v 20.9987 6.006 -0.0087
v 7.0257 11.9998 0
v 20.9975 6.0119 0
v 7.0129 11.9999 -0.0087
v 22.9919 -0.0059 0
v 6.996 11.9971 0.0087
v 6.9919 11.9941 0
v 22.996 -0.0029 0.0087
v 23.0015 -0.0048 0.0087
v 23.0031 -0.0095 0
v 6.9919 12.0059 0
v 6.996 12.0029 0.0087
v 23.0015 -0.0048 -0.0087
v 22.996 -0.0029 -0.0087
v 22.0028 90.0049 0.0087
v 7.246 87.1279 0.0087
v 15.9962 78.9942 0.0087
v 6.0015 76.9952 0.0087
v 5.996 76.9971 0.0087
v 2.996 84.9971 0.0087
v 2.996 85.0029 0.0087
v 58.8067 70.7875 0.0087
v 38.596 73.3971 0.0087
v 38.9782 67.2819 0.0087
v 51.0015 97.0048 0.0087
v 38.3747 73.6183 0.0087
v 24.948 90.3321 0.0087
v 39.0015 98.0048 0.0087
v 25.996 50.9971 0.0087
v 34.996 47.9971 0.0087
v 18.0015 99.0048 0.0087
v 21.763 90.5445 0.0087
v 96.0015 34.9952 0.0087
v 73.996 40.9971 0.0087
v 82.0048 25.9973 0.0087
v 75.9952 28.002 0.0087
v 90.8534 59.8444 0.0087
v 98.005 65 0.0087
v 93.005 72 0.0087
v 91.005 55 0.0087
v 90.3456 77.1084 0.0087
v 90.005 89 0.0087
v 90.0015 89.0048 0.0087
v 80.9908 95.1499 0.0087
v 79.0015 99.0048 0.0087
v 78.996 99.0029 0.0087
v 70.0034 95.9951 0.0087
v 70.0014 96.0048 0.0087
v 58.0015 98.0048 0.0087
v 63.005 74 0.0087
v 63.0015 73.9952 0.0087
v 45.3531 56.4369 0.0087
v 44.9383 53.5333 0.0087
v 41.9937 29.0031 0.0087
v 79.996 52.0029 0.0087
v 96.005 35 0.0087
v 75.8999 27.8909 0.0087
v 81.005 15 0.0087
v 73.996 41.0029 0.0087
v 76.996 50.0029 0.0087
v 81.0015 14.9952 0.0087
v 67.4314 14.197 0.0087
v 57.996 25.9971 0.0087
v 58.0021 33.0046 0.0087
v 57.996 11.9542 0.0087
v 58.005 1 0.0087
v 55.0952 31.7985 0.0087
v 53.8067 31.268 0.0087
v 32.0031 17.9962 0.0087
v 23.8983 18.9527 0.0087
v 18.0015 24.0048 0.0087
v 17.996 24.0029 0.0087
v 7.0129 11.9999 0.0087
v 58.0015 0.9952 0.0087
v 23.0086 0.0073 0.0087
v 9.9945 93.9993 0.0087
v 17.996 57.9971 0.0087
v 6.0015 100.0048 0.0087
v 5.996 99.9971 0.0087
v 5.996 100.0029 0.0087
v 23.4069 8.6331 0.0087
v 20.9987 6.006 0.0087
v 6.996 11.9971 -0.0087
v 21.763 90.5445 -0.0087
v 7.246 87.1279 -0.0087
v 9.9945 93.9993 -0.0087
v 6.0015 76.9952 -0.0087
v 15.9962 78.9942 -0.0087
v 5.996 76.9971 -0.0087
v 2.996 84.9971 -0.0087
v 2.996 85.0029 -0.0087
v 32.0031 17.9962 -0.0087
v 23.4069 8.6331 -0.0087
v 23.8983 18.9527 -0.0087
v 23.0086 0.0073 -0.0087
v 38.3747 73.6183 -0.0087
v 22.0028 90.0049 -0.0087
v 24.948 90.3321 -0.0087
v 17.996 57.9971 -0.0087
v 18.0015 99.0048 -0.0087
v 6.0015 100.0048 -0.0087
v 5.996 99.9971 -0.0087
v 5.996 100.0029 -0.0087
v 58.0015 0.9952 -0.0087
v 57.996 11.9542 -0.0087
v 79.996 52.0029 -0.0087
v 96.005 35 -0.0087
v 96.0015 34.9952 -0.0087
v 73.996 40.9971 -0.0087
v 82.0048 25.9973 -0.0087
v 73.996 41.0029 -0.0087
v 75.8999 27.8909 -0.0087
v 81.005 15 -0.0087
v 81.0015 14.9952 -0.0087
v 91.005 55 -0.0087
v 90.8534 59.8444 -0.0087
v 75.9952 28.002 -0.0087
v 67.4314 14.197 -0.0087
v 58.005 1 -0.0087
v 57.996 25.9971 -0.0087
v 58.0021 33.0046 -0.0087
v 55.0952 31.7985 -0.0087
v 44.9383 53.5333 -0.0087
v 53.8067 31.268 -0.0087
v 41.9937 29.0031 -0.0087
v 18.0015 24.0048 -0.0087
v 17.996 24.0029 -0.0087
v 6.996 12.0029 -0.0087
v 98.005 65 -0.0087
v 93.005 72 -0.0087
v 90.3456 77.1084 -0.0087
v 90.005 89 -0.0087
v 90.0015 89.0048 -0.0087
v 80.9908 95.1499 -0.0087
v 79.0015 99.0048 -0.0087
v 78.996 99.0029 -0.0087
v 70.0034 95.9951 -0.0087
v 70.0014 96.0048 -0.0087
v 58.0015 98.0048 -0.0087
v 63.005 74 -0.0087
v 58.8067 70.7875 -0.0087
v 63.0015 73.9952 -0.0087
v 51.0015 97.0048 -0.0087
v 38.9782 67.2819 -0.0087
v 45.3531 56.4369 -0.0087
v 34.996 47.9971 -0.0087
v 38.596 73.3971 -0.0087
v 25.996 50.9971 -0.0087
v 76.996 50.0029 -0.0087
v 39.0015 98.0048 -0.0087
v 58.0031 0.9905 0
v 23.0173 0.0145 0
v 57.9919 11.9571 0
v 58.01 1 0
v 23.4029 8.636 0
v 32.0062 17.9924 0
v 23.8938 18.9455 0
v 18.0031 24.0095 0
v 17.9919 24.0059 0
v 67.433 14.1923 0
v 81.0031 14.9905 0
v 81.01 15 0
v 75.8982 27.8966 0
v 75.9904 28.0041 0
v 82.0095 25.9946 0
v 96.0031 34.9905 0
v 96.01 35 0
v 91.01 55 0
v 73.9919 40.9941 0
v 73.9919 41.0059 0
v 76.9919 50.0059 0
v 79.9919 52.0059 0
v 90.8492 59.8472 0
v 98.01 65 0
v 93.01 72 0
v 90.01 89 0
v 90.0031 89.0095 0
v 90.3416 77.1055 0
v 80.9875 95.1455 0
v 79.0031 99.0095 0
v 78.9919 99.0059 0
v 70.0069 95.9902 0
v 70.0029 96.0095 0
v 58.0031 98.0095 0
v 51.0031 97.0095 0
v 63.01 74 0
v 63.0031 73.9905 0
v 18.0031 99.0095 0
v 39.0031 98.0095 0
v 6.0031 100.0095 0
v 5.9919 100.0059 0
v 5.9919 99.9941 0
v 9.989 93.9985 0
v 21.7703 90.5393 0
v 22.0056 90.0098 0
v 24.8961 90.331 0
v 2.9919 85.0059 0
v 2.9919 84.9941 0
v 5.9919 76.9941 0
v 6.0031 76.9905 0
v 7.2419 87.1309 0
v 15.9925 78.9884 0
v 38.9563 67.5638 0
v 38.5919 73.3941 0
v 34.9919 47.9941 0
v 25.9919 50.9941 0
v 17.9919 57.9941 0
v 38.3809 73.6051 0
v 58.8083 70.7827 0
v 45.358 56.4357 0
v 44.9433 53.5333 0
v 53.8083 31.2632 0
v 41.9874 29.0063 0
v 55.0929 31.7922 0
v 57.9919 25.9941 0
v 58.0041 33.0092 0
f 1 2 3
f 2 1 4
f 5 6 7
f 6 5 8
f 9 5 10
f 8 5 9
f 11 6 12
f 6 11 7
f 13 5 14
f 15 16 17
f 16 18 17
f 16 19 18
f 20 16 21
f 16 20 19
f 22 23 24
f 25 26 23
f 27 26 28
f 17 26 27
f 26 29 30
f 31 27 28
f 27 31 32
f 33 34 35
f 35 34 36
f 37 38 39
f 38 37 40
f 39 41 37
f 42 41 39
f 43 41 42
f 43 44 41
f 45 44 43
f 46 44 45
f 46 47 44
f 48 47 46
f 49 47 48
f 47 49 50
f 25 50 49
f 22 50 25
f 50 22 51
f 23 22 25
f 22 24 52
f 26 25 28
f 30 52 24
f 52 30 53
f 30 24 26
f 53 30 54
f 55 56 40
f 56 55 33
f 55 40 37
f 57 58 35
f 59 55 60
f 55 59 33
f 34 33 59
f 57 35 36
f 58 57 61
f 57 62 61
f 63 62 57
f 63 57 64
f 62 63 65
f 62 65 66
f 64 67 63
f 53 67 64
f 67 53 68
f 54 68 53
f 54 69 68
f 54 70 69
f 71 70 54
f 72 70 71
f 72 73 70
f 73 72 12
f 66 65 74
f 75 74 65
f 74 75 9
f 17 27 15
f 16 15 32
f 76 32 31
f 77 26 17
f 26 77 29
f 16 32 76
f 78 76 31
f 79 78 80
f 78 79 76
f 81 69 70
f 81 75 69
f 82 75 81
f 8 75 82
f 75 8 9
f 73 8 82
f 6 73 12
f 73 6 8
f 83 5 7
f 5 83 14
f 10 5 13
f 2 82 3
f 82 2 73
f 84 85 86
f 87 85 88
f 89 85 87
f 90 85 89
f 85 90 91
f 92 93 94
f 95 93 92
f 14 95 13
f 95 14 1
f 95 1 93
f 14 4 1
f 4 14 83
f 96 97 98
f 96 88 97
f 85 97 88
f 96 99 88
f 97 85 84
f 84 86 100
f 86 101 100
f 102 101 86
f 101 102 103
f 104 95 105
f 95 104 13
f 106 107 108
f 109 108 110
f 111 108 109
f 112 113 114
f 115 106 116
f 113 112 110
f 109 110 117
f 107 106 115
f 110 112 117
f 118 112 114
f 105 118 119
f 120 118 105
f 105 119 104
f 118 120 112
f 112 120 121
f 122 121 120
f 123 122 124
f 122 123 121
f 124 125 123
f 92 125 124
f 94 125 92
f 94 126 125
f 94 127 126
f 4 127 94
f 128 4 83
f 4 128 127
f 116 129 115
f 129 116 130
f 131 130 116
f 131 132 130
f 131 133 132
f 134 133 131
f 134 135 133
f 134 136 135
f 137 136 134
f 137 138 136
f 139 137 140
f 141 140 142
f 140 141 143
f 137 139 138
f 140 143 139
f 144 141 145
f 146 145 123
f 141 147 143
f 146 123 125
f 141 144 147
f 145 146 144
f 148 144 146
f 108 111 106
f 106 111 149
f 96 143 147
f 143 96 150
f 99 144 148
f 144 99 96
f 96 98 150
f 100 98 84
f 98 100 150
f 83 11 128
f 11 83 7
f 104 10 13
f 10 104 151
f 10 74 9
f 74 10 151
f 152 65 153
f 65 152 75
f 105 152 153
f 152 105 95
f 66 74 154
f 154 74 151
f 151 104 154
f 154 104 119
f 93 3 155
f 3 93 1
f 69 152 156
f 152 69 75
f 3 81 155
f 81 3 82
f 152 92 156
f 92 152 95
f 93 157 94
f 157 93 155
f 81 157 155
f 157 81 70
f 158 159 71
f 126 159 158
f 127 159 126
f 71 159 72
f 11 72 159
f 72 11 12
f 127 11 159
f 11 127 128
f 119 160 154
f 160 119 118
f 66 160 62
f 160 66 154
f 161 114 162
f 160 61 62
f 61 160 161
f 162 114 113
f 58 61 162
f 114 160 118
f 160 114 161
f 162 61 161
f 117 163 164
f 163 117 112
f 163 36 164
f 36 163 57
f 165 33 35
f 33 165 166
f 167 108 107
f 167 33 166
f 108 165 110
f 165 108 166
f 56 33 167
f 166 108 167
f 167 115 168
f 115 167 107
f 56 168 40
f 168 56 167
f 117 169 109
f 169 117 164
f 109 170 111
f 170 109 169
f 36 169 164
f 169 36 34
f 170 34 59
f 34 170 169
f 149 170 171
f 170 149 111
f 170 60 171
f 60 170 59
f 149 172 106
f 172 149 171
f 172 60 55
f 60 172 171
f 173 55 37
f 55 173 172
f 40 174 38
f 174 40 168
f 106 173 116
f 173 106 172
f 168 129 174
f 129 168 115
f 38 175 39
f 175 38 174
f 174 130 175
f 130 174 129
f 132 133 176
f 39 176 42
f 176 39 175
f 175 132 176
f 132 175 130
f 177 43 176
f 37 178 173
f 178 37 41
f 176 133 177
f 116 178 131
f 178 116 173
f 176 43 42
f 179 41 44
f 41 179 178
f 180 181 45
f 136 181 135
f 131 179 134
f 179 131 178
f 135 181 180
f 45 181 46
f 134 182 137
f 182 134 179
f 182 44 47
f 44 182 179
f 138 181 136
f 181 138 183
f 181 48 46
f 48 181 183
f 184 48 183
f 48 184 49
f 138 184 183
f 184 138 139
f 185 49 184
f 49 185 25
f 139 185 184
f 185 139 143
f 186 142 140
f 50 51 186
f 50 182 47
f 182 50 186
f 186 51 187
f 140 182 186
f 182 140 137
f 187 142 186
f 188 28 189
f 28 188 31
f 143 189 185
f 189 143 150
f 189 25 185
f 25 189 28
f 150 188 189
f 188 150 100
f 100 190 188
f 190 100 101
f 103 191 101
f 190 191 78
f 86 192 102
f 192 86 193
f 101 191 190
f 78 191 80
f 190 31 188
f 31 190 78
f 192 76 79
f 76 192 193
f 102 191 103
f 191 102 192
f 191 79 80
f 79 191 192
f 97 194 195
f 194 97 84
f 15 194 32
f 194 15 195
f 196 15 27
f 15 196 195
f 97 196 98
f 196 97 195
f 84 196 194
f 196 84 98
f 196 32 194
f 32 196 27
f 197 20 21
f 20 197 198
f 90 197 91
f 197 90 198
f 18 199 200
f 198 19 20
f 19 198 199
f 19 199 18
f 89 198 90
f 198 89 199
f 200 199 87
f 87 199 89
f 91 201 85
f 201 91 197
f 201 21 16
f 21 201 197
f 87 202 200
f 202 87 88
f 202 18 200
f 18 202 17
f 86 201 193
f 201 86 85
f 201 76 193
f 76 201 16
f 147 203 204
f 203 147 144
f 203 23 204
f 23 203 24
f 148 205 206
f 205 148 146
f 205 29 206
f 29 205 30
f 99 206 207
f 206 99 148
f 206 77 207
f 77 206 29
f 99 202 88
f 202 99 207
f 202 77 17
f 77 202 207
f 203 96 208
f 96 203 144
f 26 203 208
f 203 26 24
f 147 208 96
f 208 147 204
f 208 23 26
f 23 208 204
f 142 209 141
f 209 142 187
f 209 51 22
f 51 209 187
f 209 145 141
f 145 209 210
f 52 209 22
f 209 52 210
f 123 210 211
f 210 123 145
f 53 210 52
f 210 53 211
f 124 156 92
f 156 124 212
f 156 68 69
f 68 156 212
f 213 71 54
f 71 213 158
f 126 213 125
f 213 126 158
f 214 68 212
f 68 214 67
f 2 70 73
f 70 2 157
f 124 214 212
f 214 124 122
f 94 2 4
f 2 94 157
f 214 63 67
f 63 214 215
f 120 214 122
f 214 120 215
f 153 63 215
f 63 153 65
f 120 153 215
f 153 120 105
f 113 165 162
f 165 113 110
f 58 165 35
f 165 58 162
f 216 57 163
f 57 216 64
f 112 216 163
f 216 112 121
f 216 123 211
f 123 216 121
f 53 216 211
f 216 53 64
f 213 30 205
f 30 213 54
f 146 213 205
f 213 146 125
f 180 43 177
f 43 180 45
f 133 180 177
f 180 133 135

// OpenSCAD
color([0.29310936231965135,0.08456113000314536,0.6409271470126323]) hull(){
    translate([7,12]) sphere(0.01);
    translate([21,6]) sphere(0.01);
    translate([23,0]) sphere(0.01);
}
color([0.38512246522478266,0.6162859510128613,0.407224705538046]) hull(){
    translate([23,0]) sphere(0.01);
    translate([58,1]) sphere(0.01);
    translate([64,14]) sphere(0.01);
}
color([0.6107800780239486,0.9541913078580654,0.09369719926319908]) hull(){
    translate([21,6]) sphere(0.01);
    translate([23,0]) sphere(0.01);
    translate([32,18]) sphere(0.01);
}
color([0.4396226851829427,0.9817497074141792,0.30111933510979894]) hull(){
    translate([32,18]) sphere(0.01);
    translate([23,0]) sphere(0.01);
    translate([26,22]) sphere(0.01);
}
color([0.08571041628526821,0.691130580335744,0.16573157374072334]) hull(){
    translate([26,22]) sphere(0.01);
    translate([23,0]) sphere(0.01);
    translate([24,21]) sphere(0.01);
}
color([0.4668304924867862,0.30100213617539295,0.3511677492745029]) hull(){
    translate([24,21]) sphere(0.01);
    translate([18,24]) sphere(0.01);
    translate([26,22]) sphere(0.01);
}
color([0.05564944269037686,0.7696481469448815,0.686275624239137]) hull(){
    translate([18,24]) sphere(0.01);
    translate([7,12]) sphere(0.01);
    translate([26,22]) sphere(0.01);
}
color([0.15447252119296884,0.35335085758162643,0.18799175914388588]) hull(){
    translate([7,12]) sphere(0.01);
    translate([18,24]) sphere(0.01);
    translate([24,21]) sphere(0.01);
}
color([0.41322879780265653,0.82270842281296,0.9057146612667819]) hull(){
    translate([64,14]) sphere(0.01);
    translate([58,1]) sphere(0.01);
    translate([68,15]) sphere(0.01);
}
color([0.9688547633127277,0.5528378273263655,0.12760284187612392]) hull(){
    translate([68,15]) sphere(0.01);
    translate([81,15]) sphere(0.01);
    translate([64,14]) sphere(0.01);
}
color([0.1710979555253146,0.7131998843266452,0.6397779425125977]) hull(){
    translate([81,15]) sphere(0.01);
    translate([72,20]) sphere(0.01);
    translate([64,14]) sphere(0.01);
}
color([0.57496968906483,0.8489371230716904,0.07944838941339594]) hull(){
    translate([72,20]) sphere(0.01);
    translate([76,28]) sphere(0.01);
    translate([64,14]) sphere(0.01);
}
color([0.040333123224873146,0.9305910632054132,0.3080440975445232]) hull(){
    translate([76,28]) sphere(0.01);
    translate([79,27]) sphere(0.01);
    translate([82,26]) sphere(0.01);
}
color([0.6084655882345898,0.4923441190446234,0.7069385087242315]) hull(){
    translate([79,27]) sphere(0.01);
    translate([76,28]) sphere(0.01);
    translate([72,20]) sphere(0.01);
}
color([0.6803385961846494,0.18024793645131376,0.10787678186317007]) hull(){
    translate([82,26]) sphere(0.01);
    translate([96,35]) sphere(0.01);
    translate([76,28]) sphere(0.01);
}
color([0.1335624130282893,0.47731112778056706,0.8393950916733898]) hull(){
    translate([96,35]) sphere(0.01);
    translate([91,55]) sphere(0.01);
    translate([76,28]) sphere(0.01);
}
color([0.6780893207968227,0.08337096158279222,0.27725115680544954]) hull(){
    translate([91,55]) sphere(0.01);
    translate([81,49]) sphere(0.01);
    translate([76,28]) sphere(0.01);
}
color([0.9965791662073833,0.03375154870506614,0.10494976972159242]) hull(){
    translate([81,49]) sphere(0.01);
    translate([75,43]) sphere(0.01);
    translate([76,28]) sphere(0.01);
}
color([0.516844917539197,0.1360610465034362,0.543805910213663]) hull(){
    translate([75,43]) sphere(0.01);
    translate([74,41]) sphere(0.01);
    translate([76,28]) sphere(0.01);
}
color([0.04901628196141694,0.4867102513994055,0.8813892002857401]) hull(){
    translate([74,41]) sphere(0.01);
    translate([77,50]) sphere(0.01);
    translate([75,43]) sphere(0.01);
}
color([0.3053751014353143,0.40772022041766365,0.31297204198076634]) hull(){
    translate([77,50]) sphere(0.01);
    translate([81,49]) sphere(0.01);
    translate([75,43]) sphere(0.01);
}
color([0.49907796034366436,0.6160709555012981,0.9916538905911245]) hull(){
    translate([81,49]) sphere(0.01);
    translate([91,55]) sphere(0.01);
    translate([77,50]) sphere(0.01);
}
color([0.3123575451593331,0.46364206475662195,0.8862899719975306]) hull(){
    translate([77,50]) sphere(0.01);
    translate([80,52]) sphere(0.01);
    translate([81,49]) sphere(0.01);
}
color([0.5738800220993816,0.8494037217359881,0.24323676398212035]) hull(){
    translate([80,52]) sphere(0.01);
    translate([91,55]) sphere(0.01);
    translate([98,65]) sphere(0.01);
}
color([0.8402878098664139,0.9530478541805099,0.16594803365564914]) hull(){
    translate([98,65]) sphere(0.01);
    translate([93,72]) sphere(0.01);
    translate([91,55]) sphere(0.01);
}
color([0.0023370868964924796,0.7387895340607371,0.5374530602666081]) hull(){
    translate([93,72]) sphere(0.01);
    translate([90,89]) sphere(0.01);
    translate([91,55]) sphere(0.01);
}
color([0.25604025835089217,0.4320068924153808,0.5112453323210508]) hull(){
    translate([90,89]) sphere(0.01);
    translate([83,95]) sphere(0.01);
    translate([93,72]) sphere(0.01);
}
color([0.7462272619347637,0.5039790716190428,0.8850839351693509]) hull(){
    translate([83,95]) sphere(0.01);
    translate([79,99]) sphere(0.01);
    translate([93,72]) sphere(0.01);
}
color([0.6652757233710683,0.22263754843686523,0.08942086350367451]) hull(){
    translate([79,99]) sphere(0.01);
    translate([70,96]) sphere(0.01);
    translate([83,95]) sphere(0.01);
}
color([0.6195232841458308,0.9036720387350747,0.7222923954673625]) hull(){
    translate([70,96]) sphere(0.01);
    translate([51,97]) sphere(0.01);
    translate([58,98]) sphere(0.01);
}
color([0.6665075097113882,0.5421139713900744,0.6943978877819516]) hull(){
    translate([51,97]) sphere(0.01);
    translate([50,93]) sphere(0.01);
    translate([58,98]) sphere(0.01);
}
color([0.9269770591996176,0.12480324665016229,0.8422397758241813]) hull(){
    translate([50,93]) sphere(0.01);
    translate([64,91]) sphere(0.01);
    translate([58,98]) sphere(0.01);
}
color([0.028249143050612435,0.8554899328562455,0.6212809598996976]) hull(){
    translate([64,91]) sphere(0.01);
    translate([70,96]) sphere(0.01);
    translate([58,98]) sphere(0.01);
}
color([0.6435486749275994,0.4857227915978113,0.2898251547629681]) hull(){
    translate([70,96]) sphere(0.01);
    translate([64,91]) sphere(0.01);
    translate([67,87]) sphere(0.01);
}
color([0.21709076393122206,0.4979948584580751,0.6176241526046676]) hull(){
    translate([67,87]) sphere(0.01);
    translate([63,74]) sphere(0.01);
    translate([70,96]) sphere(0.01);
}
color([0.4722249532281336,0.7228331534363125,0.6109414561657331]) hull(){
    translate([63,74]) sphere(0.01);
    translate([59,71]) sphere(0.01);
    translate([70,96]) sphere(0.01);
}
color([0.5330085163671737,0.6769359871291822,0.5973748769978083]) hull(){
    translate([59,71]) sphere(0.01);
    translate([58,98]) sphere(0.01);
    translate([70,96]) sphere(0.01);
}
color([0.14460255854654236,0.21273280877313017,0.8417179364881341]) hull(){
    translate([58,98]) sphere(0.01);
    translate([59,71]) sphere(0.01);
    translate([50,93]) sphere(0.01);
}
color([0.6300391880279899,0.5103677782275869,0.4479627161837708]) hull(){
    translate([50,93]) sphere(0.01);
    translate([59,71]) sphere(0.01);
    translate([64,91]) sphere(0.01);
}
color([0.2903518628620462,0.1744676713524972,0.5457372127765215]) hull(){
    translate([64,91]) sphere(0.01);
    translate([59,71]) sphere(0.01);
    translate([67,87]) sphere(0.01);
}
color([0.6340658375422632,0.7004271366493812,0.690956934786038]) hull(){
    translate([39,98]) sphere(0.01);
    translate([51,97]) sphere(0.01);
    translate([18,99]) sphere(0.01);
}
color([0.013948469234104865,0.8018456354370093,0.2607079205191076]) hull(){
    translate([18,99]) sphere(0.01);
    translate([6,100]) sphere(0.01);
    translate([10,94]) sphere(0.01);
}
color([0.01899716010339858,0.7507132946374245,0.44168653561511173]) hull(){
    translate([10,94]) sphere(0.01);
    translate([15,91]) sphere(0.01);
    translate([18,99]) sphere(0.01);
}
color([0.1668653701245908,0.45955837321901094,0.7876756969907556]) hull(){
    translate([15,91]) sphere(0.01);
    translate([22,90]) sphere(0.01);
    translate([18,99]) sphere(0.01);
}
color([0.09564527702692727,0.06733136152719421,0.7816649665975636]) hull(){
    translate([22,90]) sphere(0.01);
    translate([31,91]) sphere(0.01);
    translate([30,90]) sphere(0.01);
}
color([0.030385075649315252,0.33346286891595733,0.08647112242809318]) hull(){
    translate([31,91]) sphere(0.01);
    translate([39,98]) sphere(0.01);
    translate([30,90]) sphere(0.01);
}
color([0.8161439782233904,0.05657658467482607,0.8243668117903717]) hull(){
    translate([39,98]) sphere(0.01);
    translate([18,99]) sphere(0.01);
    translate([30,90]) sphere(0.01);
}
color([0.05808931884644186,0.6181904095369413,0.1426995958976538]) hull(){
    translate([30,90]) sphere(0.01);
    translate([18,99]) sphere(0.01);
    translate([15,91]) sphere(0.01);
}
color([0.3846464495954227,0.3794414211645075,0.7643773332264734]) hull(){
    translate([15,91]) sphere(0.01);
    translate([10,94]) sphere(0.01);
    translate([7,86]) sphere(0.01);
}
color([0.3116889002403487,0.7690158776827113,0.7674729074453902]) hull(){
    translate([7,86]) sphere(0.01);
    translate([3,85]) sphere(0.01);
    translate([6,84]) sphere(0.01);
}
color([0.3394448706328078,0.45855440081433096,0.0007502935671159783]) hull(){
    translate([3,85]) sphere(0.01);
    translate([6,77]) sphere(0.01);
    translate([6,84]) sphere(0.01);
}
color([0.8084995756647368,0.0331322283588068,0.9954935019736515]) hull(){
    translate([6,77]) sphere(0.01);
    translate([7,86]) sphere(0.01);
    translate([3,85]) sphere(0.01);
}
color([0.32750610520168044,0.511786711221762,0.09639677946248049]) hull(){
    translate([7,86]) sphere(0.01);
    translate([15,91]) sphere(0.01);
    translate([3,85]) sphere(0.01);
}
color([0.46647601470953737,0.043404226035316795,0.8089506697449751]) hull(){
    translate([3,85]) sphere(0.01);
    translate([15,91]) sphere(0.01);
    translate([20,83]) sphere(0.01);
}
color([0.9065579579370614,0.48874197586323487,0.4689182776921319]) hull(){
    translate([20,83]) sphere(0.01);
    translate([16,79]) sphere(0.01);
    translate([3,85]) sphere(0.01);
}
color([0.9999833648369341,0.42392948264922625,0.11056216143511133]) hull(){
    translate([16,79]) sphere(0.01);
    translate([6,77]) sphere(0.01);
    translate([3,85]) sphere(0.01);
}
color([0.5007484231317689,0.23725843071495933,0.7435751616565288]) hull(){
    translate([20,83]) sphere(0.01);
    translate([15,91]) sphere(0.01);
    translate([22,90]) sphere(0.01);
}
color([0.030326511183225713,0.9534383365251057,0.44454391677925087]) hull(){
    translate([22,90]) sphere(0.01);
    translate([10,94]) sphere(0.01);
    translate([20,83]) sphere(0.01);
}
color([0.4017260225039573,0.6984802625757133,0.14751428227125585]) hull(){
    translate([10,94]) sphere(0.01);
    translate([6,84]) sphere(0.01);
    translate([20,83]) sphere(0.01);
}
color([0.592053202978914,0.7602792343344718,0.23214841748979886]) hull(){
    translate([6,84]) sphere(0.01);
    translate([6,77]) sphere(0.01);
    translate([20,83]) sphere(0.01);
}
color([0.2215781656479593,0.24536616409996503,0.7021925659500807]) hull(){
    translate([6,77]) sphere(0.01);
    translate([16,79]) sphere(0.01);
    translate([20,83]) sphere(0.01);
}
color([0.5457605096294114,0.54011508338913,0.5459453680001618]) hull(){
    translate([37,88]) sphere(0.01);
    translate([38,83]) sphere(0.01);
    translate([31,91]) sphere(0.01);
}
color([0.21439919344985514,0.4167057873106884,0.6193494045718565]) hull(){
    translate([38,83]) sphere(0.01);
    translate([43,69]) sphere(0.01);
    translate([39,67]) sphere(0.01);
}
color([0.45760594266221877,0.8933837090972113,0.8109172526149769]) hull(){
    translate([43,69]) sphere(0.01);
    translate([46,61]) sphere(0.01);
    translate([39,67]) sphere(0.01);
}
color([0.14833972802097417,0.6068004170768148,0.5080529466064481]) hull(){
    translate([46,61]) sphere(0.01);
    translate([30,57]) sphere(0.01);
    translate([39,67]) sphere(0.01);
}
color([0.9906187087676633,0.11352393843166497,0.6883720652754897]) hull(){
    translate([30,57]) sphere(0.01);
    translate([26,51]) sphere(0.01);
    translate([35,48]) sphere(0.01);
}
color([0.5952346609945763,0.6540807806784664,0.3474259839548979]) hull(){
    translate([26,51]) sphere(0.01);
    translate([18,58]) sphere(0.01);
    translate([30,57]) sphere(0.01);
}
color([0.9928586924360654,0.247192741454632,0.70975753974483]) hull(){
    translate([18,58]) sphere(0.01);
    translate([16,79]) sphere(0.01);
    translate([30,57]) sphere(0.01);
}
color([0.13794757021236903,0.4611444179186315,0.04899626755467579]) hull(){
    translate([16,79]) sphere(0.01);
    translate([20,83]) sphere(0.01);
    translate([30,57]) sphere(0.01);
}
color([0.1977229983916683,0.036370797334404625,0.13840798504488894]) hull(){
    translate([30,57]) sphere(0.01);
    translate([20,83]) sphere(0.01);
    translate([22,90]) sphere(0.01);
}
color([0.695134065044521,0.2654011745990712,0.4635417367699751]) hull(){
    translate([22,90]) sphere(0.01);
    translate([30,90]) sphere(0.01);
    translate([30,57]) sphere(0.01);
}
color([0.14067843926211876,0.3233092624720053,0.6766209265725885]) hull(){
    translate([30,90]) sphere(0.01);
    translate([31,91]) sphere(0.01);
    translate([37,88]) sphere(0.01);
}
color([0.5598941248919586,0.2674263193966361,0.7715367321750608]) hull(){
    translate([37,88]) sphere(0.01);
    translate([39,67]) sphere(0.01);
    translate([30,90]) sphere(0.01);
}
color([0.7775867750177572,0.3358457771023752,0.7984986383285079]) hull(){
    translate([39,67]) sphere(0.01);
    translate([30,57]) sphere(0.01);
    translate([30,90]) sphere(0.01);
}
color([0.3608344962449672,0.130636609727118,0.1470050456404287]) hull(){
    translate([43,69]) sphere(0.01);
    translate([38,83]) sphere(0.01);
    translate([37,88]) sphere(0.01);
}
color([0.5817121628313788,0.46286602772829477,0.8824527290015699]) hull(){
    translate([37,88]) sphere(0.01);
    translate([39,98]) sphere(0.01);
    translate([43,69]) sphere(0.01);
}
color([0.1201105517589024,0.1938197880719691,0.4695931850983104]) hull(){
    translate([39,98]) sphere(0.01);
    translate([31,91]) sphere(0.01);
    translate([43,69]) sphere(0.01);
}
color([0.14078313852784263,0.6451769219884874,0.9811903017448982]) hull(){
    translate([43,69]) sphere(0.01);
    translate([31,91]) sphere(0.01);
    translate([22,90]) sphere(0.01);
}
color([0.8740229692652243,0.6541461711493592,0.21289315855754942]) hull(){
    translate([22,90]) sphere(0.01);
    translate([50,93]) sphere(0.01);
    translate([43,69]) sphere(0.01);
}
color([0.9328418457966335,0.42345059226773774,0.5012376899041451]) hull(){
    translate([50,93]) sphere(0.01);
    translate([59,71]) sphere(0.01);
    translate([43,69]) sphere(0.01);
}
color([0.5811541702347708,0.2791891573101454,0.2092311813057095]) hull(){
    translate([59,71]) sphere(0.01);
    translate([63,74]) sphere(0.01);
    translate([43,69]) sphere(0.01);
}
color([0.9628933046967749,0.6198760626942967,0.5999578261672418]) hull(){
    translate([63,74]) sphere(0.01);
    translate([46,61]) sphere(0.01);
    translate([43,69]) sphere(0.01);
}
color([0.23874719597172656,0.5159213977515871,0.8042715508319355]) hull(){
    translate([46,61]) sphere(0.01);
    translate([63,74]) sphere(0.01);
    translate([59,71]) sphere(0.01);
}
color([0.6755197251802578,0.41487488756696345,0.5733633065217538]) hull(){
    translate([59,71]) sphere(0.01);
    translate([44,55]) sphere(0.01);
    translate([46,61]) sphere(0.01);
}
color([0.8352652083788017,0.4789645616530247,0.8888242662849705]) hull(){
    translate([44,55]) sphere(0.01);
    translate([44,47]) sphere(0.01);
    translate([46,61]) sphere(0.01);
}
color([0.7977003312522131,0.4430245559395397,0.5757872208285841]) hull(){
    translate([44,47]) sphere(0.01);
    translate([35,48]) sphere(0.01);
    translate([46,61]) sphere(0.01);
}
color([0.18894415855786206,0.8084526775944827,0.5240727557148024]) hull(){
    translate([35,48]) sphere(0.01);
    translate([30,57]) sphere(0.01);
    translate([46,61]) sphere(0.01);
}
color([0.33009817895383553,0.6358447971330878,0.274476683198677]) hull(){
    translate([44,55]) sphere(0.01);
    translate([18,58]) sphere(0.01);
    translate([44,47]) sphere(0.01);
}
color([0.7036882936284021,0.9548751840233447,0.5755708060880032]) hull(){
    translate([18,58]) sphere(0.01);
    translate([26,51]) sphere(0.01);
    translate([44,47]) sphere(0.01);
}
color([0.41204698353559877,0.5796286851254486,0.28286322414623355]) hull(){
    translate([44,47]) sphere(0.01);
    translate([26,51]) sphere(0.01);
    translate([35,48]) sphere(0.01);
}
color([0.83488960487533,0.7968053445508819,0.9111606805714901]) hull(){
    translate([18,58]) sphere(0.01);
    translate([44,55]) sphere(0.01);
    translate([30,57]) sphere(0.01);
}
color([0.24277728252059738,0.2698201644401115,0.25372921938475945]) hull(){
    translate([30,57]) sphere(0.01);
    translate([44,55]) sphere(0.01);
    translate([39,67]) sphere(0.01);
}
color([0.3248429479181304,0.33731838939050207,0.46012102584031667]) hull(){
    translate([39,67]) sphere(0.01);
    translate([44,55]) sphere(0.01);
    translate([59,71]) sphere(0.01);
}
color([0.4972140619467261,0.4460540182101679,0.582257111213957]) hull(){
    translate([55,32]) sphere(0.01);
    translate([42,29]) sphere(0.01);
    translate([32,18]) sphere(0.01);
}
color([0.38189019333285656,0.9329183366158048,0.74346568951076]) hull(){
    translate([42,29]) sphere(0.01);
    translate([26,22]) sphere(0.01);
    translate([32,18]) sphere(0.01);
}
color([0.10367473231816282,0.6513301228797536,0.21210212161149367]) hull(){
    translate([58,33]) sphere(0.01);
    translate([55,32]) sphere(0.01);
    translate([42,29]) sphere(0.01);
}
color([0.4071949612628585,0.6715659813617996,0.17871221391606673]) hull(){
    translate([42,29]) sphere(0.01);
    translate([18,24]) sphere(0.01);
    translate([26,22]) sphere(0.01);
}
color([0.17752412341011714,0.6556599876579107,0.7040052939421468]) hull(){
    translate([18,24]) sphere(0.01);
    translate([42,29]) sphere(0.01);
    translate([24,21]) sphere(0.01);
}
color([0.9236087761692187,0.21340315940002685,0.5989435772305987]) hull(){
    translate([24,21]) sphere(0.01);
    translate([42,29]) sphere(0.01);
    translate([7,12]) sphere(0.01);
}
color([0.8450733127471588,0.6003349610680997,0.5954496070156984]) hull(){
    translate([7,12]) sphere(0.01);
    translate([42,29]) sphere(0.01);
    translate([58,33]) sphere(0.01);
}
color([0.920709623693076,0.4233833186292486,0.4754938941291812]) hull(){
    translate([64,14]) sphere(0.01);
    translate([72,20]) sphere(0.01);
    translate([55,32]) sphere(0.01);
}
color([0.872421437716006,0.9767589381362137,0.9086126193256788]) hull(){
    translate([55,32]) sphere(0.01);
    translate([58,33]) sphere(0.01);
    translate([64,14]) sphere(0.01);
}
color([0.7884233486788577,0.8262914624918754,0.6636415038118221]) hull(){
    translate([58,33]) sphere(0.01);
    translate([58,1]) sphere(0.01);
    translate([64,14]) sphere(0.01);
}
color([0.36270118963089737,0.5138414630226216,0.14357255994509865]) hull(){
    translate([58,1]) sphere(0.01);
    translate([58,33]) sphere(0.01);
    translate([68,15]) sphere(0.01);
}
color([0.466624584989368,0.29734697142143796,0.9844700368526675]) hull(){
    translate([68,15]) sphere(0.01);
    translate([58,33]) sphere(0.01);
    translate([81,15]) sphere(0.01);
}
color([0.6752891164641136,0.29017518075598103,0.4342964607752302]) hull(){
    translate([81,15]) sphere(0.01);
    translate([58,33]) sphere(0.01);
    translate([82,26]) sphere(0.01);
}
color([0.773003957160343,0.565247166210502,0.9239404304157245]) hull(){
    translate([82,26]) sphere(0.01);
    translate([58,33]) sphere(0.01);
    translate([79,27]) sphere(0.01);
}
color([0.16032310979410902,0.8355206000915061,0.5688487402091276]) hull(){
    translate([79,27]) sphere(0.01);
    translate([58,33]) sphere(0.01);
    translate([72,20]) sphere(0.01);
}
color([0.20030491603062106,0.9799112189115262,0.7788088383598656]) hull(){
    translate([72,20]) sphere(0.01);
    translate([58,33]) sphere(0.01);
    translate([55,32]) sphere(0.01);
}
color([0.3331229107175697,0.956723341350572,0.8892995412421422]) hull(){
    translate([44,55]) sphere(0.01);
    translate([58,33]) sphere(0.01);
    translate([55,32]) sphere(0.01);
}
color([0.9938355783742772,0.5564778243748569,0.9329279768345969]) hull(){
    translate([44,55]) sphere(0.01);
    translate([55,32]) sphere(0.01);
    translate([45,42]) sphere(0.01);
}
color([0.35340897744289224,0.12062022214202717,0.7238287945893779]) hull(){
    translate([45,42]) sphere(0.01);
    translate([44,47]) sphere(0.01);
    translate([44,55]) sphere(0.01);
}
color([0.8432397019629626,0.2883830928152321,0.23139986036280558]) hull(){
    translate([44,47]) sphere(0.01);
    translate([45,42]) sphere(0.01);
    translate([35,48]) sphere(0.01);
}
color([0.0180364627349191,0.35314011923198985,0.9589424474672257]) hull(){
    translate([35,48]) sphere(0.01);
    translate([45,42]) sphere(0.01);
    translate([42,29]) sphere(0.01);
}
color([0.2619290021782883,0.20369548429490625,0.5420815487250377]) hull(){
    translate([42,29]) sphere(0.01);
    translate([45,42]) sphere(0.01);
    translate([55,32]) sphere(0.01);
}
color([0.9221305525684157,0.837748898711002,0.8622867035840079]) hull(){
    translate([74,41]) sphere(0.01);
    translate([75,43]) sphere(0.01);
    translate([77,50]) sphere(0.01);
}
color([0.727429224436118,0.821332708873966,0.2567577523046298]) hull(){
    translate([80,52]) sphere(0.01);
    translate([77,50]) sphere(0.01);
    translate([91,55]) sphere(0.01);
}
color([0.1353372895865157,0.7613019869252476,0.15437996216449157]) hull(){
    translate([93,72]) sphere(0.01);
    translate([79,99]) sphere(0.01);
    translate([90,89]) sphere(0.01);
}
color([0.5724302025923821,0.22728732004270547,0.8377719495956792]) hull(){
    translate([51,97]) sphere(0.01);
    translate([39,98]) sphere(0.01);
    translate([50,93]) sphere(0.01);
}
color([0.3661955888727618,0.7135191579002272,0.515047468161266]) hull(){
    translate([50,93]) sphere(0.01);
    translate([39,98]) sphere(0.01);
    translate([43,69]) sphere(0.01);
}
color([0.13764795316468892,0.40448573996937276,0.8917260836787828]) hull(){
    translate([6,100]) sphere(0.01);
    translate([18,99]) sphere(0.01);
    translate([10,94]) sphere(0.01);
}
color([0.7643233656004556,0.5236824296690593,0.15029798138806982]) hull(){
    translate([68,15]) sphere(0.01);
    translate([82,26]) sphere(0.01);
    translate([81,15]) sphere(0.01);
}
color([0.9580407420374472,0.6000911555631969,0.025324835711835636]) hull(){
    translate([82,26]) sphere(0.01);
    translate([79,27]) sphere(0.01);
    translate([76,28]) sphere(0.01);
}
